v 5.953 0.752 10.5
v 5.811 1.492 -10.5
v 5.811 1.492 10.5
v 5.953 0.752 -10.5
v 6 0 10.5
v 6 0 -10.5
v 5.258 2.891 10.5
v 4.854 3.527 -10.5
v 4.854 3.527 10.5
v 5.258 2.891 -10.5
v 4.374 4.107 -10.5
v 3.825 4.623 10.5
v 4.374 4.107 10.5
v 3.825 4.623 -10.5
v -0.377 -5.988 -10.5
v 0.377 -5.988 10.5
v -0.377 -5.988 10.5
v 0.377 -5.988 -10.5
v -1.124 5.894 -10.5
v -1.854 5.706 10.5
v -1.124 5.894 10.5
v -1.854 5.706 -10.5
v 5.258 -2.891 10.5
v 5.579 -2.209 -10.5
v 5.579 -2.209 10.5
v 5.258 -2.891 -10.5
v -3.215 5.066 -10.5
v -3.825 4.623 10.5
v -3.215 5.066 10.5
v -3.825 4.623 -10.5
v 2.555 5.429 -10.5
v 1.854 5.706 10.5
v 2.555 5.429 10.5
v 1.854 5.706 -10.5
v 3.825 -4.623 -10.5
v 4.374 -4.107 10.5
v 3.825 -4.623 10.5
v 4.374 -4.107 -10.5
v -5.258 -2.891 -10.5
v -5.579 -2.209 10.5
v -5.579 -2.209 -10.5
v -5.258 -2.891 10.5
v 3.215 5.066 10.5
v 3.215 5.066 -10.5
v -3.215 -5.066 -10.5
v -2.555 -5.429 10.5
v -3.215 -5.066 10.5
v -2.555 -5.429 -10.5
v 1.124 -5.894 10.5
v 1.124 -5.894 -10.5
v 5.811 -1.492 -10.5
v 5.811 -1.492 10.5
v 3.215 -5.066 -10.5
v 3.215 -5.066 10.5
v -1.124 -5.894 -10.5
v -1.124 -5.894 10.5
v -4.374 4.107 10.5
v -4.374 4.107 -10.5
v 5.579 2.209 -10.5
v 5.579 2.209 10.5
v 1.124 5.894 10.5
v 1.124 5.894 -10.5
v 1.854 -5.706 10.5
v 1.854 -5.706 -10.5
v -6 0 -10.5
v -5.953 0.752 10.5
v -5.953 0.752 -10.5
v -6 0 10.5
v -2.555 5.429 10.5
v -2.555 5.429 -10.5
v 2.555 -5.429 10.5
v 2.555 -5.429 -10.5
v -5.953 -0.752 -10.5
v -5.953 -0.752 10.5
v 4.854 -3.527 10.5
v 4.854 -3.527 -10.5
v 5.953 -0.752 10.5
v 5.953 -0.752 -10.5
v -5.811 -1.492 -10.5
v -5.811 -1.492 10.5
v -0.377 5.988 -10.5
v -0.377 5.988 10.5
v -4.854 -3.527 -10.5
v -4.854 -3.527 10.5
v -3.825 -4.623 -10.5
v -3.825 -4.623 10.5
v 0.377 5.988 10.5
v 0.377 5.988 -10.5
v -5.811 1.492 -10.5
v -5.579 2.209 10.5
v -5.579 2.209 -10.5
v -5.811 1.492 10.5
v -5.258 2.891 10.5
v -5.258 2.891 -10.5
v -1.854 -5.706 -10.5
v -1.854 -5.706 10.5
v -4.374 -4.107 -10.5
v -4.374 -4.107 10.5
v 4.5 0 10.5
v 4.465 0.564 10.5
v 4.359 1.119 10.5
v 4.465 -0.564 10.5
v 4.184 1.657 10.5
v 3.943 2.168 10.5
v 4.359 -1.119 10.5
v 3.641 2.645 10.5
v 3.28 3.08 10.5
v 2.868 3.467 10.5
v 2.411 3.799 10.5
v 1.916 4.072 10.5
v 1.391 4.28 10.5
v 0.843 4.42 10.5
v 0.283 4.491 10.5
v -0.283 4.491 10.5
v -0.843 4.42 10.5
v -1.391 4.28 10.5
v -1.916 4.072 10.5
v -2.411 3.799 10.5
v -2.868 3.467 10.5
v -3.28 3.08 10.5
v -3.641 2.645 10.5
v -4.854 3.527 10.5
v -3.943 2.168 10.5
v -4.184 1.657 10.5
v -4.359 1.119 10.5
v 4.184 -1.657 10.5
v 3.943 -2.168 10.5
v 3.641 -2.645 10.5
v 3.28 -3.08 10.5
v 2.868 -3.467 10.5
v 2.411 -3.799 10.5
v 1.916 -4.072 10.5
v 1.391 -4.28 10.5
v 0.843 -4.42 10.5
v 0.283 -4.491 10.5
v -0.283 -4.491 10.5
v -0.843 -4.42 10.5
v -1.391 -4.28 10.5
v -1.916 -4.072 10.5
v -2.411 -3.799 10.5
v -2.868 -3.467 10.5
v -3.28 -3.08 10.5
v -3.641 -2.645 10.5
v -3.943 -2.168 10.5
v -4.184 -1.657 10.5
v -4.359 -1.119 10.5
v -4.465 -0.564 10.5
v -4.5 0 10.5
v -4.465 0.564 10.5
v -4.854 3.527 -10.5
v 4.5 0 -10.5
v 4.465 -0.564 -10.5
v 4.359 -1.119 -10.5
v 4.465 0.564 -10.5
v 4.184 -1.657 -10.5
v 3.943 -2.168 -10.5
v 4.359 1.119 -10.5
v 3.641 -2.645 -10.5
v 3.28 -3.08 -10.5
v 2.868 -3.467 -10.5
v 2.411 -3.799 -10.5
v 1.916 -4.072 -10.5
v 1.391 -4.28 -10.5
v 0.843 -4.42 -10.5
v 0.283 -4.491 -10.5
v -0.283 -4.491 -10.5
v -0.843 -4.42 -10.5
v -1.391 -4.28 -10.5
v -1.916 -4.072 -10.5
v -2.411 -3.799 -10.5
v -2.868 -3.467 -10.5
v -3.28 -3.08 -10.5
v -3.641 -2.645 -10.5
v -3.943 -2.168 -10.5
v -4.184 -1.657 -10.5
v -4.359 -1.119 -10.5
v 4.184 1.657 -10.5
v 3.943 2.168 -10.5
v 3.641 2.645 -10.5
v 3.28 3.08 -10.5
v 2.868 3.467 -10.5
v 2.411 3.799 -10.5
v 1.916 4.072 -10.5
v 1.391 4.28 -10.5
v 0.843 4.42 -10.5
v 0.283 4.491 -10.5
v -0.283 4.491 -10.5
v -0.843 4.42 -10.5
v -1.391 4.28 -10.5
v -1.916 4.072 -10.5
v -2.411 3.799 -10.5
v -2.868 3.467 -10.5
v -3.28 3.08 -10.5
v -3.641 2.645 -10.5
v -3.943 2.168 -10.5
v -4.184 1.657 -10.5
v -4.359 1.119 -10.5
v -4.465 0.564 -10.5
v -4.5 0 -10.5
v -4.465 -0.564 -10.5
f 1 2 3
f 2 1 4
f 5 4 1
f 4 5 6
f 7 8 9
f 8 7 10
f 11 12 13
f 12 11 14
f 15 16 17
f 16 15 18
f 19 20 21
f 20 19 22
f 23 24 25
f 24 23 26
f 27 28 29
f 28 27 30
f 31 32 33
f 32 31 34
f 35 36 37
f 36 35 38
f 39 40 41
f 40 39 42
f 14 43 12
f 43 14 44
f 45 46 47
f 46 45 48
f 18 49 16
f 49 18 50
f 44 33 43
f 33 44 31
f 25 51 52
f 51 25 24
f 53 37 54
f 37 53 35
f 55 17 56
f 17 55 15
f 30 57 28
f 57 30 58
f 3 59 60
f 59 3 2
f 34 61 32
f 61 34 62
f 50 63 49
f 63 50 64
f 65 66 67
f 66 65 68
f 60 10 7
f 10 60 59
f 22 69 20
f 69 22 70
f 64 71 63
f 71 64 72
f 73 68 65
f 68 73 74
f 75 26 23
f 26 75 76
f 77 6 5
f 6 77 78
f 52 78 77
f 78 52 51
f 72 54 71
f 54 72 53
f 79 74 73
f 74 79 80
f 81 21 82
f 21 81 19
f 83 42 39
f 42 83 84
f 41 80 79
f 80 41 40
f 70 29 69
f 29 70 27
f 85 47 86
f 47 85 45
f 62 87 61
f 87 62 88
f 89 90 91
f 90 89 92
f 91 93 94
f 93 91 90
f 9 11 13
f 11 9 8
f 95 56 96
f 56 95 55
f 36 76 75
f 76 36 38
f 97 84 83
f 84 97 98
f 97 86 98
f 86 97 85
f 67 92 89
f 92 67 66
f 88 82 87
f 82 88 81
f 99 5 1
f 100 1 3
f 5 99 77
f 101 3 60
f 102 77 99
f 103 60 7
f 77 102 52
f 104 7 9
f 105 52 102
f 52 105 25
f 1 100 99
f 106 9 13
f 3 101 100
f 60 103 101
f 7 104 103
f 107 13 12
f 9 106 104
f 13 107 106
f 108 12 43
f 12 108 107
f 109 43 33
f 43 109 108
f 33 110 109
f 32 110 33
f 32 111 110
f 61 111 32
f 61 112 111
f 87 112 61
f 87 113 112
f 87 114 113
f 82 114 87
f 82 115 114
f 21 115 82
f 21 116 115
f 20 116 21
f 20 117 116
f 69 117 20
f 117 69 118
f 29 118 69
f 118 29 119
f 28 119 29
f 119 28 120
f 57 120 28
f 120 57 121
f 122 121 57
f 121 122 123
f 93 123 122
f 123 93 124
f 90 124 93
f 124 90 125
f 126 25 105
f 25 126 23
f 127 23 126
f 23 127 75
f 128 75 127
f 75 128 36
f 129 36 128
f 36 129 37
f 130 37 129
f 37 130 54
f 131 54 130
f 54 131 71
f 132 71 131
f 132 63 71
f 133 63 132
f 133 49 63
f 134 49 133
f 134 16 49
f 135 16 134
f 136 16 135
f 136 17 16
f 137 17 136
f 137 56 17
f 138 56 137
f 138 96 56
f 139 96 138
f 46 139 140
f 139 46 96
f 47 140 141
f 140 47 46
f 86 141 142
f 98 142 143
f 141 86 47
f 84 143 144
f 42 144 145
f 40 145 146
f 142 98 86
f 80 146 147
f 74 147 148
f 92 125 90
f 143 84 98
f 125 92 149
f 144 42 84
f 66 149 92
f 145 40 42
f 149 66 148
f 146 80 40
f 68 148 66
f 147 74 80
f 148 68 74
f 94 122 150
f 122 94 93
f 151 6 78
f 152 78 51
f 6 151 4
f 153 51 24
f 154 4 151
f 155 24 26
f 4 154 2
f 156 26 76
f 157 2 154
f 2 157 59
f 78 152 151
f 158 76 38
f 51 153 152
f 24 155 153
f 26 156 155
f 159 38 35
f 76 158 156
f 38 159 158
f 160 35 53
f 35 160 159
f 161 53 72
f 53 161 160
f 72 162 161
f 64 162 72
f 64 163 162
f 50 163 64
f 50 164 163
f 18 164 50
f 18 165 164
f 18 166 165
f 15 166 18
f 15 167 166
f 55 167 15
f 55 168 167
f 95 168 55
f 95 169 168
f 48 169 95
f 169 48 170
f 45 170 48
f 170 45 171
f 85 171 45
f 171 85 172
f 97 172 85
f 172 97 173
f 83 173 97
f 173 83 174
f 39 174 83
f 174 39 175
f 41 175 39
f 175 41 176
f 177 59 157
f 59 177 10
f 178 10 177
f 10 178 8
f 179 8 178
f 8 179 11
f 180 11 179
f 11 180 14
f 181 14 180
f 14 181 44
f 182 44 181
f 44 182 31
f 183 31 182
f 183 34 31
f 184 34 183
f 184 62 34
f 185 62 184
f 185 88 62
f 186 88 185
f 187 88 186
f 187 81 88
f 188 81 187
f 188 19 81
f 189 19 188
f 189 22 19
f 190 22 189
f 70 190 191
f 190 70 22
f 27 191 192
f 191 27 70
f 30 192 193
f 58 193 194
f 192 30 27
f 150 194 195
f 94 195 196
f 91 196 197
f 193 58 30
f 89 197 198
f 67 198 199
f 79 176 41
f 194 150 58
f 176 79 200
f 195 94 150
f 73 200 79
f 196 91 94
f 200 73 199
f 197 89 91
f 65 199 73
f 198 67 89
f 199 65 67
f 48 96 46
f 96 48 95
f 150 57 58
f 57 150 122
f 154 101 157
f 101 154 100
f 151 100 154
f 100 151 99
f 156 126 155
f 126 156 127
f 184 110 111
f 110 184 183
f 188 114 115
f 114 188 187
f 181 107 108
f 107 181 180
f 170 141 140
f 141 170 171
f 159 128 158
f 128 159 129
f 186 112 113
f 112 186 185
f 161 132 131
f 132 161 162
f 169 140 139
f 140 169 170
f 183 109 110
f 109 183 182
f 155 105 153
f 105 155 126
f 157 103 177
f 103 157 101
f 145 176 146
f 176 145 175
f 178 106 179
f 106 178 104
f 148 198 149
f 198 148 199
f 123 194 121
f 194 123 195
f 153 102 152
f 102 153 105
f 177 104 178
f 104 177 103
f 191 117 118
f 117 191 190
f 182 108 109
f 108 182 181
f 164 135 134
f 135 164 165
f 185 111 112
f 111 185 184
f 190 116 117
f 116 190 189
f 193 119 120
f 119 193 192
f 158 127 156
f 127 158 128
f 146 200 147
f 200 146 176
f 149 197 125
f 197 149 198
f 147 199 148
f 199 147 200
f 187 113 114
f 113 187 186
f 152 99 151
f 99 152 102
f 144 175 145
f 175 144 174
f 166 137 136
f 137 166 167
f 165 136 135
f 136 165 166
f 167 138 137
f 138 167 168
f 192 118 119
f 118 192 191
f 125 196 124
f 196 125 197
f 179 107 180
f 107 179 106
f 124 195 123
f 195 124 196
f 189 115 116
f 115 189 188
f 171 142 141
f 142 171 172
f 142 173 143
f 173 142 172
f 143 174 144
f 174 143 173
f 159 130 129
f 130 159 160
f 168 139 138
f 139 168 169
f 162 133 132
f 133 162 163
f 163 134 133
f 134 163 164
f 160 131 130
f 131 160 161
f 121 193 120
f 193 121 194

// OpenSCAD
$fn = 50;


difference() {
	union() {
		translate(v = [0, 0, -10.5000000000]) {
			cylinder(h = 21, r = 6.0000000000);
		}
	}
	union() {
		translate(v = [0, 0, -100.0000000000]) {
			cylinder(h = 200, r = 4.5000000000);
		}
	}
}
